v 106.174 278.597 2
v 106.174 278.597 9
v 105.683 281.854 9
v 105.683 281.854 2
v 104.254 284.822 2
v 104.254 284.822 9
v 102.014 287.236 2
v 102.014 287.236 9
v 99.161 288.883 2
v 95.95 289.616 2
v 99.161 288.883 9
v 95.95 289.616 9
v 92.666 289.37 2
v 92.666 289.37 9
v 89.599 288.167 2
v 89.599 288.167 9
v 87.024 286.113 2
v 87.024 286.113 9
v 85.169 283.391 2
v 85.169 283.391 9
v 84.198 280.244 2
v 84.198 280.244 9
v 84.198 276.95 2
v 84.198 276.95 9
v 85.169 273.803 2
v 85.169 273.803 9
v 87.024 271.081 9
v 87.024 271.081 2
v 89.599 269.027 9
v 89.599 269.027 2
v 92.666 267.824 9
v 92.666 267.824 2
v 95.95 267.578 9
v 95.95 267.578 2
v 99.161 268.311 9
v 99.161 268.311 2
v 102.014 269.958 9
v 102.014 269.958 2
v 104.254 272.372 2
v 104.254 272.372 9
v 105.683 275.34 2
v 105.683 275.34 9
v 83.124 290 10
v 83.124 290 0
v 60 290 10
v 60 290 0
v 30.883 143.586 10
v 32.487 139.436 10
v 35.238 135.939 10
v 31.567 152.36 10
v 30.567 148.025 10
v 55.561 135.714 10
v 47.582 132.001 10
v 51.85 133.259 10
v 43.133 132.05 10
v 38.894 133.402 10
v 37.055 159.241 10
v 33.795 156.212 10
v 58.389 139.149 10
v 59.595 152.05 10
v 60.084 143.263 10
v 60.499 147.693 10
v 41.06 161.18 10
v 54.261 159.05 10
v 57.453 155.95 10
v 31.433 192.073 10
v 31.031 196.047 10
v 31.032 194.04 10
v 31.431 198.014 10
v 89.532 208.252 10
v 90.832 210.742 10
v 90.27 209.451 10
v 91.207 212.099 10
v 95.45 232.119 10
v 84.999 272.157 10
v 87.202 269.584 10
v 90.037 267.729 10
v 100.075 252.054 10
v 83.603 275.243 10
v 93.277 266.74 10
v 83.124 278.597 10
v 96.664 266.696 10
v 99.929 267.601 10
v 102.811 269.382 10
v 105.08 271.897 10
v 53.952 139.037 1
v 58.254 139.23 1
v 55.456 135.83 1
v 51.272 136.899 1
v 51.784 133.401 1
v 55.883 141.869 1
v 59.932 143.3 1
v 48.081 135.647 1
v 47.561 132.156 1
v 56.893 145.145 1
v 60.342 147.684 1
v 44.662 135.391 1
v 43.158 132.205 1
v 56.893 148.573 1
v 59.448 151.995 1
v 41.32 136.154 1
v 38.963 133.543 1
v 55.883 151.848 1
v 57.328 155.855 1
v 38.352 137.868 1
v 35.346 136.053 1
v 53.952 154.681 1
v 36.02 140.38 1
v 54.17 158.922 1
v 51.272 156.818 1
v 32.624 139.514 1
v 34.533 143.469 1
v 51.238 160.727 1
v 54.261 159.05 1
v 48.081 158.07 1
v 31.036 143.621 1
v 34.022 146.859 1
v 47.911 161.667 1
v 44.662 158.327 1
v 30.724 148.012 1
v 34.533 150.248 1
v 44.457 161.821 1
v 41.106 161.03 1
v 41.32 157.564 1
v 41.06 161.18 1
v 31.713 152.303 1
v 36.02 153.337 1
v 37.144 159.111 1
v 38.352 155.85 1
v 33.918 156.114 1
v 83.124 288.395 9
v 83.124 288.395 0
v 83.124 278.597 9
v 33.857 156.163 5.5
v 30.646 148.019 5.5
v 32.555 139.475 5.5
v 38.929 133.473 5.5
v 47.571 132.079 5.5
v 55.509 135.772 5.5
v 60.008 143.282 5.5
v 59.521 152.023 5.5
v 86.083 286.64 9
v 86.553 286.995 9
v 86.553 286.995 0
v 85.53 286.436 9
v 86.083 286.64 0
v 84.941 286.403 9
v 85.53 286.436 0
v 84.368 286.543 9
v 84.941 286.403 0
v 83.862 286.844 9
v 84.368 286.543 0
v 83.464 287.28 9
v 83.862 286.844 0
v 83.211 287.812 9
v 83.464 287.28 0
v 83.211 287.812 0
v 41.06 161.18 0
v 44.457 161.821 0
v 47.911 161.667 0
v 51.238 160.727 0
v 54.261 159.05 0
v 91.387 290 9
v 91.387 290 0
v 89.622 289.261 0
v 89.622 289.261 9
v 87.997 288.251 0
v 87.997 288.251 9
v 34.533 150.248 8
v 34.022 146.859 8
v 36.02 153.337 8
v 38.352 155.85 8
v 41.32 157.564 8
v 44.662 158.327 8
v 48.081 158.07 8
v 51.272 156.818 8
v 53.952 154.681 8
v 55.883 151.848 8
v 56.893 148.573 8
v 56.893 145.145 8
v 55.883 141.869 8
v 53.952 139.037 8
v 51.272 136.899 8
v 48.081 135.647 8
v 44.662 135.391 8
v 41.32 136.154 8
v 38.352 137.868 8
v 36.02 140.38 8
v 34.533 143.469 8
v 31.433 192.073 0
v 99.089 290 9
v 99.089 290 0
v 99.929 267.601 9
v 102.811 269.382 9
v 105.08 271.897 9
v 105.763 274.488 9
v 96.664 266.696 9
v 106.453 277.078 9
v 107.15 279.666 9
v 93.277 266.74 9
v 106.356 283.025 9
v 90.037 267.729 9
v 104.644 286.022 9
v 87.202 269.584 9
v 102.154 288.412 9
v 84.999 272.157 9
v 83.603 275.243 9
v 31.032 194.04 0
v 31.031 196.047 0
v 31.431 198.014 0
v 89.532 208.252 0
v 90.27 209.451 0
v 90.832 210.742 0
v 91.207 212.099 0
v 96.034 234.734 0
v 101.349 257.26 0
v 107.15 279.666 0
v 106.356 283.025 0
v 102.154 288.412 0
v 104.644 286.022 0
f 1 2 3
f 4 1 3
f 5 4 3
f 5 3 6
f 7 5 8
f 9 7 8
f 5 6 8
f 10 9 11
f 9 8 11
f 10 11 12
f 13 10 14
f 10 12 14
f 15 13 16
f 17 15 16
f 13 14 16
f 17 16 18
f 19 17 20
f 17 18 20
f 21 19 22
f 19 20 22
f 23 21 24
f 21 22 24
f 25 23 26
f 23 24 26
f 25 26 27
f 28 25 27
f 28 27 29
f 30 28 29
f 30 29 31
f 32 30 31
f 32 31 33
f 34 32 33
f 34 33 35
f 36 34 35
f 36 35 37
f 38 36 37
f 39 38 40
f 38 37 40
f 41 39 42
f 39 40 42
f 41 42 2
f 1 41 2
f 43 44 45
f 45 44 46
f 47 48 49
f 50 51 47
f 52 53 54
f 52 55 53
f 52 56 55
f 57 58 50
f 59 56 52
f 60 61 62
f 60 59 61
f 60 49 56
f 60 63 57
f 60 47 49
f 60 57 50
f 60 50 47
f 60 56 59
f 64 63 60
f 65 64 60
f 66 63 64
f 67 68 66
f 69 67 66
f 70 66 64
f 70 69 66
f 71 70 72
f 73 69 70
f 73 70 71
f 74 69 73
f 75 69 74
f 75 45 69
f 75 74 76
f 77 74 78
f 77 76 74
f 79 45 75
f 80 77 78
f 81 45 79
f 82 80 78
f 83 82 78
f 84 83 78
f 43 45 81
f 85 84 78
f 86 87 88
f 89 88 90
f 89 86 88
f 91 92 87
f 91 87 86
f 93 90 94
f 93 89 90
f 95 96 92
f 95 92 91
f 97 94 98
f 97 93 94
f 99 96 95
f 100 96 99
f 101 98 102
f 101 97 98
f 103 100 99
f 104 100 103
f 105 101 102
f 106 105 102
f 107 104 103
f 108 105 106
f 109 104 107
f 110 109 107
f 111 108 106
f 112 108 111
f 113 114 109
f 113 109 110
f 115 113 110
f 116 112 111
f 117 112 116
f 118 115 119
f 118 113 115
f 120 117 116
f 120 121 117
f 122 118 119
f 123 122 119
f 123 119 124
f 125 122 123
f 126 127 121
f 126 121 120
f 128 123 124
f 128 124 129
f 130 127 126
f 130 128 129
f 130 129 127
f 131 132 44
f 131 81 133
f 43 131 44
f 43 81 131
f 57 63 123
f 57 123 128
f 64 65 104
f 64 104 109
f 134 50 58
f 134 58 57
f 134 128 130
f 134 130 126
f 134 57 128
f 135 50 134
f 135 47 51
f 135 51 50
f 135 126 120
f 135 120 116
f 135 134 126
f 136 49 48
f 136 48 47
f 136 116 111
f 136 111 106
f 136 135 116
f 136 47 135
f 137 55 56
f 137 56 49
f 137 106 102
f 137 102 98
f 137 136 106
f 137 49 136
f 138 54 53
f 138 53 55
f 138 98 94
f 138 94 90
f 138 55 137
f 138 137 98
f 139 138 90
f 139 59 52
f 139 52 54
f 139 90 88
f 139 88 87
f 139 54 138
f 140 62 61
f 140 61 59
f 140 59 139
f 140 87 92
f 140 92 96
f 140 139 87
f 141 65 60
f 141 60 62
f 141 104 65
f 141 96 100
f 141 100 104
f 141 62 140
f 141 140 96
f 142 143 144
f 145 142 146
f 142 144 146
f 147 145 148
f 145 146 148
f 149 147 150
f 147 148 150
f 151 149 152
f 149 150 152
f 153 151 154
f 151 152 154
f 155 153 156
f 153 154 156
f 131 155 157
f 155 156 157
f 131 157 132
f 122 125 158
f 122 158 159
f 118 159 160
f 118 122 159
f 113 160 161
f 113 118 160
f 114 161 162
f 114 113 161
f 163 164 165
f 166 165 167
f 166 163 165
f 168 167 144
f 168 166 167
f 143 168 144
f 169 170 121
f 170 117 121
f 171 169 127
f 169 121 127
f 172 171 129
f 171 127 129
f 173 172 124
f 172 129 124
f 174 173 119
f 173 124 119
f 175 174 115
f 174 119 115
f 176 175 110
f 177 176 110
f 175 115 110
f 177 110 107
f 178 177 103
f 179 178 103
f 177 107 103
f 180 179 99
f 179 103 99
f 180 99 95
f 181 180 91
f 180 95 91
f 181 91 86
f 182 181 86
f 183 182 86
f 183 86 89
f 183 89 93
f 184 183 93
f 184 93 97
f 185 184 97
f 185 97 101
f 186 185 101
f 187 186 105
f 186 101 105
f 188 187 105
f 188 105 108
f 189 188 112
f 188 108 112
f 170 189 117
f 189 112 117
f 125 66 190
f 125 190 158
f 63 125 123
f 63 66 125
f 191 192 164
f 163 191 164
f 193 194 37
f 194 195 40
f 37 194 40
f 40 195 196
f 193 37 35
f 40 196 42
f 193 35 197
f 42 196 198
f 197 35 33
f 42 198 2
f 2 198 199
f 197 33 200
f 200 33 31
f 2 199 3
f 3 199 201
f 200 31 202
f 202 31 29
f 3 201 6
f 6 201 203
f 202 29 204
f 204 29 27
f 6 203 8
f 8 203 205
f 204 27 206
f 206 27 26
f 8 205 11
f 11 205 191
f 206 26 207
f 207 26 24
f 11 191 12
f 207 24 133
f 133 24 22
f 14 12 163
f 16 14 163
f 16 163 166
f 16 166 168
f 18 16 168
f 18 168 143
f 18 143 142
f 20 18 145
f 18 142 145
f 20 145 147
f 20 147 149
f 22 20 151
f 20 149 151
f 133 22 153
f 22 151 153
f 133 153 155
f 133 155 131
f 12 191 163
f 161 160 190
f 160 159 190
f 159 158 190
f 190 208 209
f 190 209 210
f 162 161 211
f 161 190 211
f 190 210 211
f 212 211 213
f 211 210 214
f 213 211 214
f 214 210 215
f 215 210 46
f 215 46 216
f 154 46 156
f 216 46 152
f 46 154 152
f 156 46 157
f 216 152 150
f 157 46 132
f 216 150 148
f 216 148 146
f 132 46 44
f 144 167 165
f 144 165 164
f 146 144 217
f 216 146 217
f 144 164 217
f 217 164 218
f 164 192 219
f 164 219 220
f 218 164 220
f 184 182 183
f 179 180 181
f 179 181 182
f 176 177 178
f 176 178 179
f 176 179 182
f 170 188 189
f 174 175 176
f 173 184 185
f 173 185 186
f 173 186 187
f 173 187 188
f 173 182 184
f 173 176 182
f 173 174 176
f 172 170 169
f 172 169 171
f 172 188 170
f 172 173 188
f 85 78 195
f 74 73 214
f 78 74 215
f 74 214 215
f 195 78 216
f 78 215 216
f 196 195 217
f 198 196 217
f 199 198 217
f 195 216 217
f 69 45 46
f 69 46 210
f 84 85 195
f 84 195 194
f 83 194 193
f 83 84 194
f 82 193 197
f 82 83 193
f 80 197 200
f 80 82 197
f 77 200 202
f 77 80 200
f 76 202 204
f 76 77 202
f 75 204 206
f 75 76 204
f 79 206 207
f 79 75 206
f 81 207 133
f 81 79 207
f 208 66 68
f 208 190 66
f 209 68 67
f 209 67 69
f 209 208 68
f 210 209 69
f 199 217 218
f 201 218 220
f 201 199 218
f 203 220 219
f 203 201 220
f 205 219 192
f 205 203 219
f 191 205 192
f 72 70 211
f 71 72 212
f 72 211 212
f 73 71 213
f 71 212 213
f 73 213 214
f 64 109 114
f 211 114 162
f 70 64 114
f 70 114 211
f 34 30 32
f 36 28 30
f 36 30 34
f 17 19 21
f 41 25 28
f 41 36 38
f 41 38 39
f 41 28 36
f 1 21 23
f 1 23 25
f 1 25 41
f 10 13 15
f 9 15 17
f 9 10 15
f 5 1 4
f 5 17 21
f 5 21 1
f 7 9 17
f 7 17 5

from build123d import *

# Parameters (mm, degrees)
BOSS_EXTRUDE1_DEPTH = 10
CUT_EXTRUDE3_REACH  = 312.322
SKETCH6_W           = 166.922568412
SKETCH6_H           = 253.34709858
BOSS_EXTRUDE2_DEPTH = 10
SKETCH11_R          = 15
BOSS_EXTRUDE4_DEPTH = 9
BOSS_EXTRUDE4_DRAFT = -1
FILLET1_R           = 10
SKETCH15_R          = 11.5
CUT_EXTRUDE6_DEPTH  = 7
SKETCH17_R          = 15
CUT_EXTRUDE7_DEPTH  = 2
CUT_EXTRUDE8_DEPTH  = 1
SKETCH19_R          = 11.05
CUT_EXTRUDE9_DEPTH  = 7
CUT_EXTRUDE10_DEPTH = 10
FILLET2_R           = 2
CUT_EXTRUDE11_DEPTH = 10
FILLET3_R           = 10


with BuildPart() as part:
    # Sketch2 → Boss-Extrude1 (new body)
    with BuildSketch(Plane.XY):
        with BuildLine():
            Line((0, 0), (70, 0))
            ThreePointArc((70, 0), (80.047115298, 146.372811683), (110, 290))
            Line((110, 290), (50, 290))
            ThreePointArc((50, 290), (12.591539765, 147.139389696), (0, 0))
        make_face()
    extrude(amount=BOSS_EXTRUDE1_DEPTH)

    # Sketch6 → Cut-Extrude3 (cut, up to next)
    with BuildSketch(Plane.XY.offset(10), mode=Mode.PRIVATE) as cut_extrude3_sk1:
        with Locations((50.25677389, 83.32645071)):
            Rectangle(SKETCH6_W, SKETCH6_H)
    cut_extrude3_tool1 = extrude(cut_extrude3_sk1.sketch, amount=-CUT_EXTRUDE3_REACH, mode=Mode.PRIVATE) & part.part
    add(cut_extrude3_tool1.solids().sort_by_distance((50.256774, 83.326451, 10))[0], mode=Mode.SUBTRACT)

    # Sketch8 → Boss-Extrude2 (add)
    with BuildSketch(Plane.XY.offset(10)):
        Polygon((25.847632867, 210), (45.521845529, 146.858679142), (90.78507317, 210), align=None)
    extrude(amount=-BOSS_EXTRUDE2_DEPTH)


with BuildPart() as boss_extrude4_tool:
    # Sketch11 → Boss-Extrude4 (with draft: the straight prism first)
    with BuildSketch(Plane.XY.offset(10)):
        with Locations((45.521845529, 146.858679142)):
            Circle(SKETCH11_R)
    extrude(amount=-BOSS_EXTRUDE4_DEPTH)
    # Boss-Extrude4: the draft: its side faces are tilted about the plane it starts from
    boss_extrude4_sides = [boss_extrude4_tool.faces().sort_by_distance(p)[0] for p in [
        (30.521845529, 146.858679142, 5.5),
    ]]
    draft(boss_extrude4_sides, Plane.XY.offset(10), BOSS_EXTRUDE4_DRAFT)


with BuildPart() as part_1:
    add(part.part)

    # Boss-Extrude4: add boss_extrude4_tool
    add(boss_extrude4_tool.part)

    # Fillet1
    fillet1_edges = [part_1.edges().sort_by_distance(p)[0] for p in [
        (25.847632867, 210, 5),
        (90.78507317, 210, 5),
    ]]
    fillet(fillet1_edges, radius=FILLET1_R)

    # Sketch15 → Cut-Extrude6 (cut, symmetric)
    with BuildSketch(Plane(origin=(0, 0, 1), x_dir=(-1, 0, 0), z_dir=(0, 0, -1))):
        with Locations((-45.521845529, 146.858679142)):
            Circle(SKETCH15_R)
    extrude(amount=CUT_EXTRUDE6_DEPTH, both=True, mode=Mode.SUBTRACT)

    # Sketch17 → Cut-Extrude7 (cut)
    with BuildSketch(Plane(origin=(0, 0, 1), x_dir=(-1, 0, 0), z_dir=(0, 0, -1))):
        with Locations((-45.521845529, 146.858679142)):
            Circle(SKETCH17_R)
    extrude(amount=CUT_EXTRUDE7_DEPTH, mode=Mode.SUBTRACT)

    # Sketch18 → Cut-Extrude8 (cut)
    with BuildSketch(Plane.XY.offset(10)):
        with BuildLine():
            Line((83.124410279, 278.596969533), (83.124410279, 292.663120803))
            Line((83.124410279, 292.663120803), (111.699174515, 292.663120803))
            Line((111.699174515, 292.663120803), (111.699174515, 271.967063838))
            Line((111.699174515, 271.967063838), (105.126627558, 271.967063838))
            ThreePointArc((105.126627558, 271.967063838), (91.662229416, 267.107265286), (83.124410279, 278.596969533))
        make_face()
    extrude(amount=-CUT_EXTRUDE8_DEPTH, mode=Mode.SUBTRACT)

    # Sketch19 → Cut-Extrude9 (cut)
    with BuildSketch(Plane.XY.offset(9)):
        with Locations((95.124410279, 278.596969533)):
            Circle(SKETCH19_R)
    extrude(amount=-CUT_EXTRUDE9_DEPTH, mode=Mode.SUBTRACT)

    # Sketch21 → Cut-Extrude10 (cut)
    with BuildSketch(Plane.XY.offset(9)):
        with BuildLine():
            Line((83.124410279, 278.596969533), (83.124410279, 291.961474959))
            Line((83.124410279, 291.961474959), (91.38664408, 291.961474959))
            Line((91.38664408, 291.961474959), (91.38664408, 290))
            ThreePointArc((91.38664408, 290), (85.407075398, 285.63780775), (83.124410279, 278.596969533))
        make_face()
        with BuildLine():
            Line((97.418656909, 290.449512128), (97.418656909, 291.961474959))
            Line((97.418656909, 291.961474959), (113.129922851, 291.961474959))
            Line((113.129922851, 291.961474959), (113.129922851, 278.596969533))
            Line((113.129922851, 278.596969533), (107.196954898, 278.596969533))
            ThreePointArc((107.196954898, 278.596969533), (104.436867753, 286.279707937), (97.418656909, 290.449512128))
        make_face()
    extrude(amount=-CUT_EXTRUDE10_DEPTH, mode=Mode.SUBTRACT)

    # Fillet2
    fillet2_edges = [part_1.edges().sort_by_distance(p)[0] for p in [
        (83.124410279, 278.596969533, 4.5),
    ]]
    fillet(fillet2_edges, radius=FILLET2_R)

    # Sketch22 → Cut-Extrude11 (cut)
    with BuildSketch(Plane.XY.offset(10)):
        Polygon((60, 290), (29.380219364, 191.412034288), (8.711867435, 204.425441059), (44.690109682, 301.643244577), align=None)
    extrude(amount=-CUT_EXTRUDE11_DEPTH, mode=Mode.SUBTRACT)

    # Fillet3
    fillet3_edges = [part_1.edges().sort_by_distance(p)[0] for p in [
        (30.508011562, 195.04324053, 5),
    ]]
    fillet(fillet3_edges, radius=FILLET3_R)


solid = part_1.part
